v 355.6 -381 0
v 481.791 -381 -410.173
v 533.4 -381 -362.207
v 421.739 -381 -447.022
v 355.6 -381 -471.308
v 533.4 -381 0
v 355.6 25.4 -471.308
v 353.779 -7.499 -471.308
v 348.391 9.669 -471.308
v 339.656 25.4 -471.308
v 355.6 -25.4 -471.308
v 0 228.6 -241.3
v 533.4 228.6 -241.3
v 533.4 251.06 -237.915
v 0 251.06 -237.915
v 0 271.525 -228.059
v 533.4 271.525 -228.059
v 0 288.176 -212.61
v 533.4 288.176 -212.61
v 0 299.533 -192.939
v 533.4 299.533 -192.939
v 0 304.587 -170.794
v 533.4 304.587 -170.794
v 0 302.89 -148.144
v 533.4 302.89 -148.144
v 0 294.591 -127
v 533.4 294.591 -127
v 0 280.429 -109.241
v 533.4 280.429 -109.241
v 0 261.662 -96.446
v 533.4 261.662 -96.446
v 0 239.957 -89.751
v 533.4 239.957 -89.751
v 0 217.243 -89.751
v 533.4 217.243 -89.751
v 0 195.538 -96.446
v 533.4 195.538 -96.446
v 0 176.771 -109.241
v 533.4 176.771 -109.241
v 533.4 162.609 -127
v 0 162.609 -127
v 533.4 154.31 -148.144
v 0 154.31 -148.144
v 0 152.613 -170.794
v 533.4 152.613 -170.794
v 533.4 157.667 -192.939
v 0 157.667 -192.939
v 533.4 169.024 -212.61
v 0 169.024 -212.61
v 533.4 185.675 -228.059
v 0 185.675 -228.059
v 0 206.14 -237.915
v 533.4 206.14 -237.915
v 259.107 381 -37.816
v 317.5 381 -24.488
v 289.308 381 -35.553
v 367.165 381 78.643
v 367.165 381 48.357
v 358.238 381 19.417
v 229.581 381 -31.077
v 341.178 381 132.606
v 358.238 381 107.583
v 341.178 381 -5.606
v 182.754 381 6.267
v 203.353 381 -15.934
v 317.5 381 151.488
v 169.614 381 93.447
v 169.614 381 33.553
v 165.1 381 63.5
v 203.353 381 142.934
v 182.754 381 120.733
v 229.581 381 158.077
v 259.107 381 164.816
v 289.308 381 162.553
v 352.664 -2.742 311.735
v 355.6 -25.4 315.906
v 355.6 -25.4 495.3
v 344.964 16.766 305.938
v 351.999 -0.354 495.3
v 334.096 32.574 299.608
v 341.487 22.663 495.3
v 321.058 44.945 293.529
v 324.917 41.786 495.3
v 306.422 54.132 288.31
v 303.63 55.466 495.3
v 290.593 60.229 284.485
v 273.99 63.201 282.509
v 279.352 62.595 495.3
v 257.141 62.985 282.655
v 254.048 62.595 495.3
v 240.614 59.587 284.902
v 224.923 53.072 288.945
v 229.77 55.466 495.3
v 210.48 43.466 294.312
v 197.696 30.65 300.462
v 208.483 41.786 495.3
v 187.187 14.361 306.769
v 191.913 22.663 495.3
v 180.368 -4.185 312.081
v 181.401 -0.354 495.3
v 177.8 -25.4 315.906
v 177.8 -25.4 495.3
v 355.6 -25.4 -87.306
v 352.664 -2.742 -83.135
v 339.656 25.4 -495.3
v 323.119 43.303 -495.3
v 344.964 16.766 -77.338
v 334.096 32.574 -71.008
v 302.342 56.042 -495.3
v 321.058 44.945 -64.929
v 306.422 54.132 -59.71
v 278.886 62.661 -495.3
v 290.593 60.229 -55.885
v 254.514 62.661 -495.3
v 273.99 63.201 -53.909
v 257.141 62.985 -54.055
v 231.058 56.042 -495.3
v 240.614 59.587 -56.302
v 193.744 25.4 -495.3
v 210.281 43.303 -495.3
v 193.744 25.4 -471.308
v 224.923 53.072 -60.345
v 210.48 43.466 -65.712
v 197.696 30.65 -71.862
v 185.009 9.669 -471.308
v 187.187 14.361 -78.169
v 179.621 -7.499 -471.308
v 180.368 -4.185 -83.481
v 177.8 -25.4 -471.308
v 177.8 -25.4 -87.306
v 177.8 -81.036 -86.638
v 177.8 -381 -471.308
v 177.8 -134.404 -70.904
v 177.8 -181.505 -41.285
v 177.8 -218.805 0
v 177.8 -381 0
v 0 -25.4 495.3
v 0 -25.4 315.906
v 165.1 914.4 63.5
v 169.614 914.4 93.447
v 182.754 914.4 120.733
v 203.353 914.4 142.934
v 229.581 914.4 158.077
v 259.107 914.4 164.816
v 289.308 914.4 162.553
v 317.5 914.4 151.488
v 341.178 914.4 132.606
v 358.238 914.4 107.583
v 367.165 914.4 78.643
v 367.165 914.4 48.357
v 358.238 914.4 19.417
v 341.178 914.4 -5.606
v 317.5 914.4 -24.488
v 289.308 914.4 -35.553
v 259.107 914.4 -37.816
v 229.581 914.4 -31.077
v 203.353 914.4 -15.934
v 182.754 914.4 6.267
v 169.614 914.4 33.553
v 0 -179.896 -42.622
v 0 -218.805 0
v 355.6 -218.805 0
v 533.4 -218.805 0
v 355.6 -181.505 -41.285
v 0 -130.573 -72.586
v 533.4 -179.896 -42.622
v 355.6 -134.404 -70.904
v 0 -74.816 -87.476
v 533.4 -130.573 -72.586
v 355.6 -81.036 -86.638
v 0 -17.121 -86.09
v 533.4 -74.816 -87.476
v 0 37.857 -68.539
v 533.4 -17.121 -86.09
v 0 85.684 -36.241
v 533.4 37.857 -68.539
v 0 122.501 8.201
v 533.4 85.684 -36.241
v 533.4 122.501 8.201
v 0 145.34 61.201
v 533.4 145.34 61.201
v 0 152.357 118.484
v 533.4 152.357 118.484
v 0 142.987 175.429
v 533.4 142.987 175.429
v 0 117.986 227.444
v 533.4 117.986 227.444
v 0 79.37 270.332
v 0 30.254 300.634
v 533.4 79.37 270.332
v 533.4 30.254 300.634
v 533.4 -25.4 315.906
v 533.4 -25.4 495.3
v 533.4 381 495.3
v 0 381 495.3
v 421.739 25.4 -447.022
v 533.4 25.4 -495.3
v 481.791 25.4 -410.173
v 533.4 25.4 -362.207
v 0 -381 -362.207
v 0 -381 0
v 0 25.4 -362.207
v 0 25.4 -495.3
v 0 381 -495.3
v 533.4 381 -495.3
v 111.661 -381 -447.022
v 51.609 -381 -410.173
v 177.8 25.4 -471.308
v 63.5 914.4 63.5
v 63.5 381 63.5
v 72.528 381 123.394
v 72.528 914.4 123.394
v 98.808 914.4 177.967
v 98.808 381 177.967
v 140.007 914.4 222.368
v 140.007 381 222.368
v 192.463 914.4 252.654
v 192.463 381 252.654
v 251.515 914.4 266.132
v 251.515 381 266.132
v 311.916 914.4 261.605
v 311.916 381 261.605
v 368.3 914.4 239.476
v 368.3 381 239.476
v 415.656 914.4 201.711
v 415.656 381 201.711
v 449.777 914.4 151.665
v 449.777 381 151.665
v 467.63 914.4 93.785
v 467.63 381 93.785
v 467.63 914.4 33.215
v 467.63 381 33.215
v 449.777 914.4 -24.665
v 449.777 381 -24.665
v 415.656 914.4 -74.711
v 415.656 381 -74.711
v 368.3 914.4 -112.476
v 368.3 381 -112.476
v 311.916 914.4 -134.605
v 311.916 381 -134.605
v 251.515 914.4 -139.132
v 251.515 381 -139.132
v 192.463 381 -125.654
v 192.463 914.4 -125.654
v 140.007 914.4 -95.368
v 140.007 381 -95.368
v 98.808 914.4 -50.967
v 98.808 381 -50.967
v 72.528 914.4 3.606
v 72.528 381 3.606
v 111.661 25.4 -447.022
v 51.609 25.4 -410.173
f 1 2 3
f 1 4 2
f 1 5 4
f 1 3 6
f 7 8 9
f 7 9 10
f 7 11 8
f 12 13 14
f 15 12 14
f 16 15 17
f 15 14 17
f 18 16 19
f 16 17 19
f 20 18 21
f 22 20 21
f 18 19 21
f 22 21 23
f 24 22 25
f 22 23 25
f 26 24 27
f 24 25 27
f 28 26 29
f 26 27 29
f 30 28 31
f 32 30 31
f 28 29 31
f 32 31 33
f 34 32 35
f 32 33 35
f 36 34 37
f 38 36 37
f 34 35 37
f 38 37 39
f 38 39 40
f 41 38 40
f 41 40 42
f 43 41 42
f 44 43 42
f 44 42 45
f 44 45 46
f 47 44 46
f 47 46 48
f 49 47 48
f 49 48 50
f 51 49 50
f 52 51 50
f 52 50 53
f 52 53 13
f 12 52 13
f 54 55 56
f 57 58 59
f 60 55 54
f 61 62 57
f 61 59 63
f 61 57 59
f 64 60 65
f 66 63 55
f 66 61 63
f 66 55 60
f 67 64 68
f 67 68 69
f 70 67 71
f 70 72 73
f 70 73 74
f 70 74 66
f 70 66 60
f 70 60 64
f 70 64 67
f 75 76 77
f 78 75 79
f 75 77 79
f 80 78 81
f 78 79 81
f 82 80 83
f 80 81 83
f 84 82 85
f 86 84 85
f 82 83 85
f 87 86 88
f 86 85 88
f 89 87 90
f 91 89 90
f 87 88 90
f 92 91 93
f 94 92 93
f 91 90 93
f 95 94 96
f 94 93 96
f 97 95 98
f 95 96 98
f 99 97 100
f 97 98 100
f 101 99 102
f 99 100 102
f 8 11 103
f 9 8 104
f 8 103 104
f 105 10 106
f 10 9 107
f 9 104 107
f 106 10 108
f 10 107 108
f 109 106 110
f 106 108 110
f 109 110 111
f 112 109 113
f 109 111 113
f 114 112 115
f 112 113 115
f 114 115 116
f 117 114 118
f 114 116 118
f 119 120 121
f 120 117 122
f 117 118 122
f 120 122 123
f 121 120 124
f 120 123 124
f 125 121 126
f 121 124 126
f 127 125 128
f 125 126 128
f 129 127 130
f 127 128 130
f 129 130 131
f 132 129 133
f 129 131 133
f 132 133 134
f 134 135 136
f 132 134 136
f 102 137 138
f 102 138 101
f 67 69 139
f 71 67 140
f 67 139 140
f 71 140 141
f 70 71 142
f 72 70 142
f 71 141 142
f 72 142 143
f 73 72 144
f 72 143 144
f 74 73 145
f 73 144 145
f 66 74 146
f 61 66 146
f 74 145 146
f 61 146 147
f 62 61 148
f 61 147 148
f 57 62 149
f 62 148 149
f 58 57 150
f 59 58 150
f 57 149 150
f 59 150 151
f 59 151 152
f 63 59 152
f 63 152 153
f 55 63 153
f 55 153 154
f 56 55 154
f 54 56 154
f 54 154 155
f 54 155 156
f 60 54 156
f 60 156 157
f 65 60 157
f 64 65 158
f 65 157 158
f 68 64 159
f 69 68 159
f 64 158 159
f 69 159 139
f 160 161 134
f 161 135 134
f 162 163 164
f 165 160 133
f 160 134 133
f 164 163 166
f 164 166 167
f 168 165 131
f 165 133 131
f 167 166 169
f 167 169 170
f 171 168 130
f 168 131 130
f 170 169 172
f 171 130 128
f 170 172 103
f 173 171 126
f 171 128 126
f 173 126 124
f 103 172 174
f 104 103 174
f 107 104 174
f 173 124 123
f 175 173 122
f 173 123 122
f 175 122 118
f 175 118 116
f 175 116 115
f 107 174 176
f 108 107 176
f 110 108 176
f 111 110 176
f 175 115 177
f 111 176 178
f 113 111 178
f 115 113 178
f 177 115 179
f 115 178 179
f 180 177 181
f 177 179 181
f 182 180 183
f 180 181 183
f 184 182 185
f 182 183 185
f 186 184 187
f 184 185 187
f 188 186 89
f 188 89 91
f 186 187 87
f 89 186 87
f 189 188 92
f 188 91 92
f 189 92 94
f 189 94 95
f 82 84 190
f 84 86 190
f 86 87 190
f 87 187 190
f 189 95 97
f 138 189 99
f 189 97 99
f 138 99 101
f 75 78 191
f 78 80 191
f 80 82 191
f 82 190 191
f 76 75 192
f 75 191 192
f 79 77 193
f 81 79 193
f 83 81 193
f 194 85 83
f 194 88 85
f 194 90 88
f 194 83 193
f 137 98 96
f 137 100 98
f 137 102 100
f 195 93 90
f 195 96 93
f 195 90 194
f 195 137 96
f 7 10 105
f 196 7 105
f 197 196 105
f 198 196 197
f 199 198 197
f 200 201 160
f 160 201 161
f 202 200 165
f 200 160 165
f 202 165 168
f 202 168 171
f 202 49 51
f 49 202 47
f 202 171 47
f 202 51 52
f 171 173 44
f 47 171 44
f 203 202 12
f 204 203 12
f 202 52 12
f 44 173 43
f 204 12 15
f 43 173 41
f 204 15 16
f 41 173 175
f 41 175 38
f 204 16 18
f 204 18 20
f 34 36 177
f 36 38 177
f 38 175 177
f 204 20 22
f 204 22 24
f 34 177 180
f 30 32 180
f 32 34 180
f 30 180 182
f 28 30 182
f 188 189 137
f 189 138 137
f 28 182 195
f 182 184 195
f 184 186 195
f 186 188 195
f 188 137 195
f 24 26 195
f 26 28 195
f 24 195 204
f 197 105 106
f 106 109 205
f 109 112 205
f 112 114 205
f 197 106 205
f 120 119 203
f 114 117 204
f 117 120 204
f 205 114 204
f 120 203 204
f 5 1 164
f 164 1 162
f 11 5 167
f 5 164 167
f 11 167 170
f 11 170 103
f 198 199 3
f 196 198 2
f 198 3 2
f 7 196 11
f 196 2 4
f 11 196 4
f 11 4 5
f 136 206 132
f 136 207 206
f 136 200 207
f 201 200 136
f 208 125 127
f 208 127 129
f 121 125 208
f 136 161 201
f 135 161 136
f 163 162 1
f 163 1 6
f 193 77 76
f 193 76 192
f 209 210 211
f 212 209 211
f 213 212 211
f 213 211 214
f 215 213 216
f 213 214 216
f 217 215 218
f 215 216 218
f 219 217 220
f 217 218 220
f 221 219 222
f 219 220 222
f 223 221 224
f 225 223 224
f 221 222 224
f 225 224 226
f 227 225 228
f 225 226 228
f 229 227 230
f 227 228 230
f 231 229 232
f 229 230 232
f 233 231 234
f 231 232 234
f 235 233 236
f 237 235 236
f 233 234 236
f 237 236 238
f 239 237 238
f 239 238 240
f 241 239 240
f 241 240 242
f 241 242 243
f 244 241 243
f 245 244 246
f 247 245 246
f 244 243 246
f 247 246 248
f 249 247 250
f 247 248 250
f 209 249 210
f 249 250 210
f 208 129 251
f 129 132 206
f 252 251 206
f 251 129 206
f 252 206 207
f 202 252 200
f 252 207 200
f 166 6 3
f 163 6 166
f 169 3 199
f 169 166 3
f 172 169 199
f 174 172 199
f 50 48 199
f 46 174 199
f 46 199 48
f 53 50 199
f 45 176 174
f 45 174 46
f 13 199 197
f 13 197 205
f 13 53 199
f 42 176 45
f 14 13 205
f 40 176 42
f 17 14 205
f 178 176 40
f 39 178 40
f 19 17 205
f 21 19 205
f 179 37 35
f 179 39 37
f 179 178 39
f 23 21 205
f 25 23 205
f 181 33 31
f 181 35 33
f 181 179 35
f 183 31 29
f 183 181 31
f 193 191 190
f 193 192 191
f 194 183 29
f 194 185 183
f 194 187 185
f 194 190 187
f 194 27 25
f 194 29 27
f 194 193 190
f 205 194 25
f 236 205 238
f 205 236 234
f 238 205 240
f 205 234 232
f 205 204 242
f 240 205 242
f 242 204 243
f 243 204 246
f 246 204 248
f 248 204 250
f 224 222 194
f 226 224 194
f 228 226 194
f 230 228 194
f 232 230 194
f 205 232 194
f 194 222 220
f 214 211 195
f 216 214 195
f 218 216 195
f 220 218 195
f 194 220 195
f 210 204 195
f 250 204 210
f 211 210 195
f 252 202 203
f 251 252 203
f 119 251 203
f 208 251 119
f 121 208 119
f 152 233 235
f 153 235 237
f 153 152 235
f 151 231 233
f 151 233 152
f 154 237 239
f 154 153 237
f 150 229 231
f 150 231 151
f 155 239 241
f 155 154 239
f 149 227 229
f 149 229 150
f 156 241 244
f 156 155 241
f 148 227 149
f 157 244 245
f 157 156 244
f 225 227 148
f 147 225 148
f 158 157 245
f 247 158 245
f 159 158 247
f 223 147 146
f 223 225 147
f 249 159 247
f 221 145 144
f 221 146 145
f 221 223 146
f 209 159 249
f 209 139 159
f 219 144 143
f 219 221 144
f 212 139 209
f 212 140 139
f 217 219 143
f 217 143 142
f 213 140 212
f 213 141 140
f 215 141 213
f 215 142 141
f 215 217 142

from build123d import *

# Parameters (mm, degrees)
F0_W      = 762
F0_H      = 990.6
F1_DEPTH  = 533.4
F2_W      = 177.8
F2_H      = 355.6
F3_DEPTH  = 495.3
F4_DEPTH  = 1188.72
F6_DEPTH  = 406.4
F8_DEPTH  = 406.4
F10_DEPTH = 533.4
F11_R     = 101.6
F12_DEPTH = 533.4
F14_DEPTH = 751.84
F16_DEPTH = 1084.58


with BuildPart() as f1:
    # F0 (on Right) → F1 (new body)
    with BuildSketch(Plane.YZ):
        Rectangle(F0_W, F0_H)
    extrude(amount=F1_DEPTH)

    # F2 (on face) → F3 (cut)
    with BuildSketch(Plane.XY.offset(495.3)):
        with Locations((88.9, -203.2)):
            Rectangle(F2_W, F2_H)
        with Locations((444.5, -203.2)):
            Rectangle(F2_W, F2_H)
    extrude(amount=-F3_DEPTH, mode=Mode.SUBTRACT)

    # F2 (on face) → F4 (cut)
    with BuildSketch(Plane.XY.offset(495.3)):
        with BuildLine():
            Line((355.6, -381), (355.6, -25.4))
            ThreePointArc((355.6, -25.4), (266.7, 63.5), (177.8, -25.4))
            Line((177.8, -25.4), (177.8, -381))
            Line((177.8, -381), (355.6, -381))
        make_face()
    extrude(amount=-F4_DEPTH, mode=Mode.SUBTRACT)

    # F5 (on face) → F6 (cut)
    with BuildSketch(Plane.XZ.offset(381)):
        with BuildLine():
            Line((533.4, -495.3), (533.4, -362.2072915536))
            ThreePointArc((533.4, -362.2072915536), (452.6800879623, -430.0887112407), (355.6, -471.3082194778))
            Line((355.6, -471.3082194778), (355.6, -495.3))
            Line((355.6, -495.3), (533.4, -495.3))
        make_face()
    extrude(amount=-F6_DEPTH, mode=Mode.SUBTRACT)

    # F7 (on face) → F8 (cut)
    with BuildSketch(Plane.XZ.offset(381)):
        with BuildLine():
            ThreePointArc((177.8, -471.3082194778), (80.7199120377, -430.0887112407), (0, -362.2072915536))
            Line((0, -362.2072915536), (0, -495.3))
            Line((0, -495.3), (177.8, -495.3))
            Line((177.8, -495.3), (177.8, -471.3082194778))
        make_face()
    extrude(amount=-F8_DEPTH, mode=Mode.SUBTRACT)

    # F9 (on face) → F10 (join)
    with BuildSketch(Plane(origin=(0, 381, 0), x_dir=(-1, 0, 0), z_dir=(0, 1, 0))):
        with BuildLine():
            ThreePointArc((-266.7, -139.7), (-123.0159020629, -80.1840979371), (-63.5, 63.5))
            ThreePointArc((-63.5, 63.5), (-410.3840979371, 207.1840979371), (-266.7, -139.7))
        make_face()
    extrude(amount=F10_DEPTH)

    # F11 (on face) → F12 (cut)
    with BuildSketch(Plane(origin=(0, 914.4, 0), x_dir=(-1, 0, 0), z_dir=(0, 1, 0))):
        with Locations((-266.7, 63.5)):
            Circle(F11_R)
    extrude(amount=-F12_DEPTH, mode=Mode.SUBTRACT)

    # F14 (cut): a face of the model
    f14_faces = [f1.faces().sort_by_distance(p)[0] for p in [
        (355.6, 0, -483.3041097389),
    ]]
    extrude(f14_faces, amount=-F14_DEPTH, mode=Mode.SUBTRACT)

    # F15 (on face) → F16 (cut)
    with BuildSketch(Plane.YZ.offset(533.4)):
        with BuildLine():
            ThreePointArc((152.4, -165.1), (174.7184632736, -218.9815367264), (228.6, -241.3))
            Line((228.6, -241.3), (228.6, -165.1))
            Line((228.6, -165.1), (152.4, -165.1))
        make_face()
        with BuildLine():
            ThreePointArc((152.4, 114.3), (-194.4840979371, 257.9840979371), (-50.8, -88.9))
            ThreePointArc((-50.8, -88.9), (92.8840979371, -29.3840979371), (152.4, 114.3))
        make_face()
        with BuildLine():
            Line((228.6, -165.1), (228.6, -241.3))
            ThreePointArc((228.6, -241.3), (282.4815367264, -218.9815367264), (304.8, -165.1))
            ThreePointArc((304.8, -165.1), (228.6, -88.9), (152.4, -165.1))
            Line((152.4, -165.1), (228.6, -165.1))
        make_face()
    extrude(amount=-F16_DEPTH, mode=Mode.SUBTRACT)


solid = f1.part
